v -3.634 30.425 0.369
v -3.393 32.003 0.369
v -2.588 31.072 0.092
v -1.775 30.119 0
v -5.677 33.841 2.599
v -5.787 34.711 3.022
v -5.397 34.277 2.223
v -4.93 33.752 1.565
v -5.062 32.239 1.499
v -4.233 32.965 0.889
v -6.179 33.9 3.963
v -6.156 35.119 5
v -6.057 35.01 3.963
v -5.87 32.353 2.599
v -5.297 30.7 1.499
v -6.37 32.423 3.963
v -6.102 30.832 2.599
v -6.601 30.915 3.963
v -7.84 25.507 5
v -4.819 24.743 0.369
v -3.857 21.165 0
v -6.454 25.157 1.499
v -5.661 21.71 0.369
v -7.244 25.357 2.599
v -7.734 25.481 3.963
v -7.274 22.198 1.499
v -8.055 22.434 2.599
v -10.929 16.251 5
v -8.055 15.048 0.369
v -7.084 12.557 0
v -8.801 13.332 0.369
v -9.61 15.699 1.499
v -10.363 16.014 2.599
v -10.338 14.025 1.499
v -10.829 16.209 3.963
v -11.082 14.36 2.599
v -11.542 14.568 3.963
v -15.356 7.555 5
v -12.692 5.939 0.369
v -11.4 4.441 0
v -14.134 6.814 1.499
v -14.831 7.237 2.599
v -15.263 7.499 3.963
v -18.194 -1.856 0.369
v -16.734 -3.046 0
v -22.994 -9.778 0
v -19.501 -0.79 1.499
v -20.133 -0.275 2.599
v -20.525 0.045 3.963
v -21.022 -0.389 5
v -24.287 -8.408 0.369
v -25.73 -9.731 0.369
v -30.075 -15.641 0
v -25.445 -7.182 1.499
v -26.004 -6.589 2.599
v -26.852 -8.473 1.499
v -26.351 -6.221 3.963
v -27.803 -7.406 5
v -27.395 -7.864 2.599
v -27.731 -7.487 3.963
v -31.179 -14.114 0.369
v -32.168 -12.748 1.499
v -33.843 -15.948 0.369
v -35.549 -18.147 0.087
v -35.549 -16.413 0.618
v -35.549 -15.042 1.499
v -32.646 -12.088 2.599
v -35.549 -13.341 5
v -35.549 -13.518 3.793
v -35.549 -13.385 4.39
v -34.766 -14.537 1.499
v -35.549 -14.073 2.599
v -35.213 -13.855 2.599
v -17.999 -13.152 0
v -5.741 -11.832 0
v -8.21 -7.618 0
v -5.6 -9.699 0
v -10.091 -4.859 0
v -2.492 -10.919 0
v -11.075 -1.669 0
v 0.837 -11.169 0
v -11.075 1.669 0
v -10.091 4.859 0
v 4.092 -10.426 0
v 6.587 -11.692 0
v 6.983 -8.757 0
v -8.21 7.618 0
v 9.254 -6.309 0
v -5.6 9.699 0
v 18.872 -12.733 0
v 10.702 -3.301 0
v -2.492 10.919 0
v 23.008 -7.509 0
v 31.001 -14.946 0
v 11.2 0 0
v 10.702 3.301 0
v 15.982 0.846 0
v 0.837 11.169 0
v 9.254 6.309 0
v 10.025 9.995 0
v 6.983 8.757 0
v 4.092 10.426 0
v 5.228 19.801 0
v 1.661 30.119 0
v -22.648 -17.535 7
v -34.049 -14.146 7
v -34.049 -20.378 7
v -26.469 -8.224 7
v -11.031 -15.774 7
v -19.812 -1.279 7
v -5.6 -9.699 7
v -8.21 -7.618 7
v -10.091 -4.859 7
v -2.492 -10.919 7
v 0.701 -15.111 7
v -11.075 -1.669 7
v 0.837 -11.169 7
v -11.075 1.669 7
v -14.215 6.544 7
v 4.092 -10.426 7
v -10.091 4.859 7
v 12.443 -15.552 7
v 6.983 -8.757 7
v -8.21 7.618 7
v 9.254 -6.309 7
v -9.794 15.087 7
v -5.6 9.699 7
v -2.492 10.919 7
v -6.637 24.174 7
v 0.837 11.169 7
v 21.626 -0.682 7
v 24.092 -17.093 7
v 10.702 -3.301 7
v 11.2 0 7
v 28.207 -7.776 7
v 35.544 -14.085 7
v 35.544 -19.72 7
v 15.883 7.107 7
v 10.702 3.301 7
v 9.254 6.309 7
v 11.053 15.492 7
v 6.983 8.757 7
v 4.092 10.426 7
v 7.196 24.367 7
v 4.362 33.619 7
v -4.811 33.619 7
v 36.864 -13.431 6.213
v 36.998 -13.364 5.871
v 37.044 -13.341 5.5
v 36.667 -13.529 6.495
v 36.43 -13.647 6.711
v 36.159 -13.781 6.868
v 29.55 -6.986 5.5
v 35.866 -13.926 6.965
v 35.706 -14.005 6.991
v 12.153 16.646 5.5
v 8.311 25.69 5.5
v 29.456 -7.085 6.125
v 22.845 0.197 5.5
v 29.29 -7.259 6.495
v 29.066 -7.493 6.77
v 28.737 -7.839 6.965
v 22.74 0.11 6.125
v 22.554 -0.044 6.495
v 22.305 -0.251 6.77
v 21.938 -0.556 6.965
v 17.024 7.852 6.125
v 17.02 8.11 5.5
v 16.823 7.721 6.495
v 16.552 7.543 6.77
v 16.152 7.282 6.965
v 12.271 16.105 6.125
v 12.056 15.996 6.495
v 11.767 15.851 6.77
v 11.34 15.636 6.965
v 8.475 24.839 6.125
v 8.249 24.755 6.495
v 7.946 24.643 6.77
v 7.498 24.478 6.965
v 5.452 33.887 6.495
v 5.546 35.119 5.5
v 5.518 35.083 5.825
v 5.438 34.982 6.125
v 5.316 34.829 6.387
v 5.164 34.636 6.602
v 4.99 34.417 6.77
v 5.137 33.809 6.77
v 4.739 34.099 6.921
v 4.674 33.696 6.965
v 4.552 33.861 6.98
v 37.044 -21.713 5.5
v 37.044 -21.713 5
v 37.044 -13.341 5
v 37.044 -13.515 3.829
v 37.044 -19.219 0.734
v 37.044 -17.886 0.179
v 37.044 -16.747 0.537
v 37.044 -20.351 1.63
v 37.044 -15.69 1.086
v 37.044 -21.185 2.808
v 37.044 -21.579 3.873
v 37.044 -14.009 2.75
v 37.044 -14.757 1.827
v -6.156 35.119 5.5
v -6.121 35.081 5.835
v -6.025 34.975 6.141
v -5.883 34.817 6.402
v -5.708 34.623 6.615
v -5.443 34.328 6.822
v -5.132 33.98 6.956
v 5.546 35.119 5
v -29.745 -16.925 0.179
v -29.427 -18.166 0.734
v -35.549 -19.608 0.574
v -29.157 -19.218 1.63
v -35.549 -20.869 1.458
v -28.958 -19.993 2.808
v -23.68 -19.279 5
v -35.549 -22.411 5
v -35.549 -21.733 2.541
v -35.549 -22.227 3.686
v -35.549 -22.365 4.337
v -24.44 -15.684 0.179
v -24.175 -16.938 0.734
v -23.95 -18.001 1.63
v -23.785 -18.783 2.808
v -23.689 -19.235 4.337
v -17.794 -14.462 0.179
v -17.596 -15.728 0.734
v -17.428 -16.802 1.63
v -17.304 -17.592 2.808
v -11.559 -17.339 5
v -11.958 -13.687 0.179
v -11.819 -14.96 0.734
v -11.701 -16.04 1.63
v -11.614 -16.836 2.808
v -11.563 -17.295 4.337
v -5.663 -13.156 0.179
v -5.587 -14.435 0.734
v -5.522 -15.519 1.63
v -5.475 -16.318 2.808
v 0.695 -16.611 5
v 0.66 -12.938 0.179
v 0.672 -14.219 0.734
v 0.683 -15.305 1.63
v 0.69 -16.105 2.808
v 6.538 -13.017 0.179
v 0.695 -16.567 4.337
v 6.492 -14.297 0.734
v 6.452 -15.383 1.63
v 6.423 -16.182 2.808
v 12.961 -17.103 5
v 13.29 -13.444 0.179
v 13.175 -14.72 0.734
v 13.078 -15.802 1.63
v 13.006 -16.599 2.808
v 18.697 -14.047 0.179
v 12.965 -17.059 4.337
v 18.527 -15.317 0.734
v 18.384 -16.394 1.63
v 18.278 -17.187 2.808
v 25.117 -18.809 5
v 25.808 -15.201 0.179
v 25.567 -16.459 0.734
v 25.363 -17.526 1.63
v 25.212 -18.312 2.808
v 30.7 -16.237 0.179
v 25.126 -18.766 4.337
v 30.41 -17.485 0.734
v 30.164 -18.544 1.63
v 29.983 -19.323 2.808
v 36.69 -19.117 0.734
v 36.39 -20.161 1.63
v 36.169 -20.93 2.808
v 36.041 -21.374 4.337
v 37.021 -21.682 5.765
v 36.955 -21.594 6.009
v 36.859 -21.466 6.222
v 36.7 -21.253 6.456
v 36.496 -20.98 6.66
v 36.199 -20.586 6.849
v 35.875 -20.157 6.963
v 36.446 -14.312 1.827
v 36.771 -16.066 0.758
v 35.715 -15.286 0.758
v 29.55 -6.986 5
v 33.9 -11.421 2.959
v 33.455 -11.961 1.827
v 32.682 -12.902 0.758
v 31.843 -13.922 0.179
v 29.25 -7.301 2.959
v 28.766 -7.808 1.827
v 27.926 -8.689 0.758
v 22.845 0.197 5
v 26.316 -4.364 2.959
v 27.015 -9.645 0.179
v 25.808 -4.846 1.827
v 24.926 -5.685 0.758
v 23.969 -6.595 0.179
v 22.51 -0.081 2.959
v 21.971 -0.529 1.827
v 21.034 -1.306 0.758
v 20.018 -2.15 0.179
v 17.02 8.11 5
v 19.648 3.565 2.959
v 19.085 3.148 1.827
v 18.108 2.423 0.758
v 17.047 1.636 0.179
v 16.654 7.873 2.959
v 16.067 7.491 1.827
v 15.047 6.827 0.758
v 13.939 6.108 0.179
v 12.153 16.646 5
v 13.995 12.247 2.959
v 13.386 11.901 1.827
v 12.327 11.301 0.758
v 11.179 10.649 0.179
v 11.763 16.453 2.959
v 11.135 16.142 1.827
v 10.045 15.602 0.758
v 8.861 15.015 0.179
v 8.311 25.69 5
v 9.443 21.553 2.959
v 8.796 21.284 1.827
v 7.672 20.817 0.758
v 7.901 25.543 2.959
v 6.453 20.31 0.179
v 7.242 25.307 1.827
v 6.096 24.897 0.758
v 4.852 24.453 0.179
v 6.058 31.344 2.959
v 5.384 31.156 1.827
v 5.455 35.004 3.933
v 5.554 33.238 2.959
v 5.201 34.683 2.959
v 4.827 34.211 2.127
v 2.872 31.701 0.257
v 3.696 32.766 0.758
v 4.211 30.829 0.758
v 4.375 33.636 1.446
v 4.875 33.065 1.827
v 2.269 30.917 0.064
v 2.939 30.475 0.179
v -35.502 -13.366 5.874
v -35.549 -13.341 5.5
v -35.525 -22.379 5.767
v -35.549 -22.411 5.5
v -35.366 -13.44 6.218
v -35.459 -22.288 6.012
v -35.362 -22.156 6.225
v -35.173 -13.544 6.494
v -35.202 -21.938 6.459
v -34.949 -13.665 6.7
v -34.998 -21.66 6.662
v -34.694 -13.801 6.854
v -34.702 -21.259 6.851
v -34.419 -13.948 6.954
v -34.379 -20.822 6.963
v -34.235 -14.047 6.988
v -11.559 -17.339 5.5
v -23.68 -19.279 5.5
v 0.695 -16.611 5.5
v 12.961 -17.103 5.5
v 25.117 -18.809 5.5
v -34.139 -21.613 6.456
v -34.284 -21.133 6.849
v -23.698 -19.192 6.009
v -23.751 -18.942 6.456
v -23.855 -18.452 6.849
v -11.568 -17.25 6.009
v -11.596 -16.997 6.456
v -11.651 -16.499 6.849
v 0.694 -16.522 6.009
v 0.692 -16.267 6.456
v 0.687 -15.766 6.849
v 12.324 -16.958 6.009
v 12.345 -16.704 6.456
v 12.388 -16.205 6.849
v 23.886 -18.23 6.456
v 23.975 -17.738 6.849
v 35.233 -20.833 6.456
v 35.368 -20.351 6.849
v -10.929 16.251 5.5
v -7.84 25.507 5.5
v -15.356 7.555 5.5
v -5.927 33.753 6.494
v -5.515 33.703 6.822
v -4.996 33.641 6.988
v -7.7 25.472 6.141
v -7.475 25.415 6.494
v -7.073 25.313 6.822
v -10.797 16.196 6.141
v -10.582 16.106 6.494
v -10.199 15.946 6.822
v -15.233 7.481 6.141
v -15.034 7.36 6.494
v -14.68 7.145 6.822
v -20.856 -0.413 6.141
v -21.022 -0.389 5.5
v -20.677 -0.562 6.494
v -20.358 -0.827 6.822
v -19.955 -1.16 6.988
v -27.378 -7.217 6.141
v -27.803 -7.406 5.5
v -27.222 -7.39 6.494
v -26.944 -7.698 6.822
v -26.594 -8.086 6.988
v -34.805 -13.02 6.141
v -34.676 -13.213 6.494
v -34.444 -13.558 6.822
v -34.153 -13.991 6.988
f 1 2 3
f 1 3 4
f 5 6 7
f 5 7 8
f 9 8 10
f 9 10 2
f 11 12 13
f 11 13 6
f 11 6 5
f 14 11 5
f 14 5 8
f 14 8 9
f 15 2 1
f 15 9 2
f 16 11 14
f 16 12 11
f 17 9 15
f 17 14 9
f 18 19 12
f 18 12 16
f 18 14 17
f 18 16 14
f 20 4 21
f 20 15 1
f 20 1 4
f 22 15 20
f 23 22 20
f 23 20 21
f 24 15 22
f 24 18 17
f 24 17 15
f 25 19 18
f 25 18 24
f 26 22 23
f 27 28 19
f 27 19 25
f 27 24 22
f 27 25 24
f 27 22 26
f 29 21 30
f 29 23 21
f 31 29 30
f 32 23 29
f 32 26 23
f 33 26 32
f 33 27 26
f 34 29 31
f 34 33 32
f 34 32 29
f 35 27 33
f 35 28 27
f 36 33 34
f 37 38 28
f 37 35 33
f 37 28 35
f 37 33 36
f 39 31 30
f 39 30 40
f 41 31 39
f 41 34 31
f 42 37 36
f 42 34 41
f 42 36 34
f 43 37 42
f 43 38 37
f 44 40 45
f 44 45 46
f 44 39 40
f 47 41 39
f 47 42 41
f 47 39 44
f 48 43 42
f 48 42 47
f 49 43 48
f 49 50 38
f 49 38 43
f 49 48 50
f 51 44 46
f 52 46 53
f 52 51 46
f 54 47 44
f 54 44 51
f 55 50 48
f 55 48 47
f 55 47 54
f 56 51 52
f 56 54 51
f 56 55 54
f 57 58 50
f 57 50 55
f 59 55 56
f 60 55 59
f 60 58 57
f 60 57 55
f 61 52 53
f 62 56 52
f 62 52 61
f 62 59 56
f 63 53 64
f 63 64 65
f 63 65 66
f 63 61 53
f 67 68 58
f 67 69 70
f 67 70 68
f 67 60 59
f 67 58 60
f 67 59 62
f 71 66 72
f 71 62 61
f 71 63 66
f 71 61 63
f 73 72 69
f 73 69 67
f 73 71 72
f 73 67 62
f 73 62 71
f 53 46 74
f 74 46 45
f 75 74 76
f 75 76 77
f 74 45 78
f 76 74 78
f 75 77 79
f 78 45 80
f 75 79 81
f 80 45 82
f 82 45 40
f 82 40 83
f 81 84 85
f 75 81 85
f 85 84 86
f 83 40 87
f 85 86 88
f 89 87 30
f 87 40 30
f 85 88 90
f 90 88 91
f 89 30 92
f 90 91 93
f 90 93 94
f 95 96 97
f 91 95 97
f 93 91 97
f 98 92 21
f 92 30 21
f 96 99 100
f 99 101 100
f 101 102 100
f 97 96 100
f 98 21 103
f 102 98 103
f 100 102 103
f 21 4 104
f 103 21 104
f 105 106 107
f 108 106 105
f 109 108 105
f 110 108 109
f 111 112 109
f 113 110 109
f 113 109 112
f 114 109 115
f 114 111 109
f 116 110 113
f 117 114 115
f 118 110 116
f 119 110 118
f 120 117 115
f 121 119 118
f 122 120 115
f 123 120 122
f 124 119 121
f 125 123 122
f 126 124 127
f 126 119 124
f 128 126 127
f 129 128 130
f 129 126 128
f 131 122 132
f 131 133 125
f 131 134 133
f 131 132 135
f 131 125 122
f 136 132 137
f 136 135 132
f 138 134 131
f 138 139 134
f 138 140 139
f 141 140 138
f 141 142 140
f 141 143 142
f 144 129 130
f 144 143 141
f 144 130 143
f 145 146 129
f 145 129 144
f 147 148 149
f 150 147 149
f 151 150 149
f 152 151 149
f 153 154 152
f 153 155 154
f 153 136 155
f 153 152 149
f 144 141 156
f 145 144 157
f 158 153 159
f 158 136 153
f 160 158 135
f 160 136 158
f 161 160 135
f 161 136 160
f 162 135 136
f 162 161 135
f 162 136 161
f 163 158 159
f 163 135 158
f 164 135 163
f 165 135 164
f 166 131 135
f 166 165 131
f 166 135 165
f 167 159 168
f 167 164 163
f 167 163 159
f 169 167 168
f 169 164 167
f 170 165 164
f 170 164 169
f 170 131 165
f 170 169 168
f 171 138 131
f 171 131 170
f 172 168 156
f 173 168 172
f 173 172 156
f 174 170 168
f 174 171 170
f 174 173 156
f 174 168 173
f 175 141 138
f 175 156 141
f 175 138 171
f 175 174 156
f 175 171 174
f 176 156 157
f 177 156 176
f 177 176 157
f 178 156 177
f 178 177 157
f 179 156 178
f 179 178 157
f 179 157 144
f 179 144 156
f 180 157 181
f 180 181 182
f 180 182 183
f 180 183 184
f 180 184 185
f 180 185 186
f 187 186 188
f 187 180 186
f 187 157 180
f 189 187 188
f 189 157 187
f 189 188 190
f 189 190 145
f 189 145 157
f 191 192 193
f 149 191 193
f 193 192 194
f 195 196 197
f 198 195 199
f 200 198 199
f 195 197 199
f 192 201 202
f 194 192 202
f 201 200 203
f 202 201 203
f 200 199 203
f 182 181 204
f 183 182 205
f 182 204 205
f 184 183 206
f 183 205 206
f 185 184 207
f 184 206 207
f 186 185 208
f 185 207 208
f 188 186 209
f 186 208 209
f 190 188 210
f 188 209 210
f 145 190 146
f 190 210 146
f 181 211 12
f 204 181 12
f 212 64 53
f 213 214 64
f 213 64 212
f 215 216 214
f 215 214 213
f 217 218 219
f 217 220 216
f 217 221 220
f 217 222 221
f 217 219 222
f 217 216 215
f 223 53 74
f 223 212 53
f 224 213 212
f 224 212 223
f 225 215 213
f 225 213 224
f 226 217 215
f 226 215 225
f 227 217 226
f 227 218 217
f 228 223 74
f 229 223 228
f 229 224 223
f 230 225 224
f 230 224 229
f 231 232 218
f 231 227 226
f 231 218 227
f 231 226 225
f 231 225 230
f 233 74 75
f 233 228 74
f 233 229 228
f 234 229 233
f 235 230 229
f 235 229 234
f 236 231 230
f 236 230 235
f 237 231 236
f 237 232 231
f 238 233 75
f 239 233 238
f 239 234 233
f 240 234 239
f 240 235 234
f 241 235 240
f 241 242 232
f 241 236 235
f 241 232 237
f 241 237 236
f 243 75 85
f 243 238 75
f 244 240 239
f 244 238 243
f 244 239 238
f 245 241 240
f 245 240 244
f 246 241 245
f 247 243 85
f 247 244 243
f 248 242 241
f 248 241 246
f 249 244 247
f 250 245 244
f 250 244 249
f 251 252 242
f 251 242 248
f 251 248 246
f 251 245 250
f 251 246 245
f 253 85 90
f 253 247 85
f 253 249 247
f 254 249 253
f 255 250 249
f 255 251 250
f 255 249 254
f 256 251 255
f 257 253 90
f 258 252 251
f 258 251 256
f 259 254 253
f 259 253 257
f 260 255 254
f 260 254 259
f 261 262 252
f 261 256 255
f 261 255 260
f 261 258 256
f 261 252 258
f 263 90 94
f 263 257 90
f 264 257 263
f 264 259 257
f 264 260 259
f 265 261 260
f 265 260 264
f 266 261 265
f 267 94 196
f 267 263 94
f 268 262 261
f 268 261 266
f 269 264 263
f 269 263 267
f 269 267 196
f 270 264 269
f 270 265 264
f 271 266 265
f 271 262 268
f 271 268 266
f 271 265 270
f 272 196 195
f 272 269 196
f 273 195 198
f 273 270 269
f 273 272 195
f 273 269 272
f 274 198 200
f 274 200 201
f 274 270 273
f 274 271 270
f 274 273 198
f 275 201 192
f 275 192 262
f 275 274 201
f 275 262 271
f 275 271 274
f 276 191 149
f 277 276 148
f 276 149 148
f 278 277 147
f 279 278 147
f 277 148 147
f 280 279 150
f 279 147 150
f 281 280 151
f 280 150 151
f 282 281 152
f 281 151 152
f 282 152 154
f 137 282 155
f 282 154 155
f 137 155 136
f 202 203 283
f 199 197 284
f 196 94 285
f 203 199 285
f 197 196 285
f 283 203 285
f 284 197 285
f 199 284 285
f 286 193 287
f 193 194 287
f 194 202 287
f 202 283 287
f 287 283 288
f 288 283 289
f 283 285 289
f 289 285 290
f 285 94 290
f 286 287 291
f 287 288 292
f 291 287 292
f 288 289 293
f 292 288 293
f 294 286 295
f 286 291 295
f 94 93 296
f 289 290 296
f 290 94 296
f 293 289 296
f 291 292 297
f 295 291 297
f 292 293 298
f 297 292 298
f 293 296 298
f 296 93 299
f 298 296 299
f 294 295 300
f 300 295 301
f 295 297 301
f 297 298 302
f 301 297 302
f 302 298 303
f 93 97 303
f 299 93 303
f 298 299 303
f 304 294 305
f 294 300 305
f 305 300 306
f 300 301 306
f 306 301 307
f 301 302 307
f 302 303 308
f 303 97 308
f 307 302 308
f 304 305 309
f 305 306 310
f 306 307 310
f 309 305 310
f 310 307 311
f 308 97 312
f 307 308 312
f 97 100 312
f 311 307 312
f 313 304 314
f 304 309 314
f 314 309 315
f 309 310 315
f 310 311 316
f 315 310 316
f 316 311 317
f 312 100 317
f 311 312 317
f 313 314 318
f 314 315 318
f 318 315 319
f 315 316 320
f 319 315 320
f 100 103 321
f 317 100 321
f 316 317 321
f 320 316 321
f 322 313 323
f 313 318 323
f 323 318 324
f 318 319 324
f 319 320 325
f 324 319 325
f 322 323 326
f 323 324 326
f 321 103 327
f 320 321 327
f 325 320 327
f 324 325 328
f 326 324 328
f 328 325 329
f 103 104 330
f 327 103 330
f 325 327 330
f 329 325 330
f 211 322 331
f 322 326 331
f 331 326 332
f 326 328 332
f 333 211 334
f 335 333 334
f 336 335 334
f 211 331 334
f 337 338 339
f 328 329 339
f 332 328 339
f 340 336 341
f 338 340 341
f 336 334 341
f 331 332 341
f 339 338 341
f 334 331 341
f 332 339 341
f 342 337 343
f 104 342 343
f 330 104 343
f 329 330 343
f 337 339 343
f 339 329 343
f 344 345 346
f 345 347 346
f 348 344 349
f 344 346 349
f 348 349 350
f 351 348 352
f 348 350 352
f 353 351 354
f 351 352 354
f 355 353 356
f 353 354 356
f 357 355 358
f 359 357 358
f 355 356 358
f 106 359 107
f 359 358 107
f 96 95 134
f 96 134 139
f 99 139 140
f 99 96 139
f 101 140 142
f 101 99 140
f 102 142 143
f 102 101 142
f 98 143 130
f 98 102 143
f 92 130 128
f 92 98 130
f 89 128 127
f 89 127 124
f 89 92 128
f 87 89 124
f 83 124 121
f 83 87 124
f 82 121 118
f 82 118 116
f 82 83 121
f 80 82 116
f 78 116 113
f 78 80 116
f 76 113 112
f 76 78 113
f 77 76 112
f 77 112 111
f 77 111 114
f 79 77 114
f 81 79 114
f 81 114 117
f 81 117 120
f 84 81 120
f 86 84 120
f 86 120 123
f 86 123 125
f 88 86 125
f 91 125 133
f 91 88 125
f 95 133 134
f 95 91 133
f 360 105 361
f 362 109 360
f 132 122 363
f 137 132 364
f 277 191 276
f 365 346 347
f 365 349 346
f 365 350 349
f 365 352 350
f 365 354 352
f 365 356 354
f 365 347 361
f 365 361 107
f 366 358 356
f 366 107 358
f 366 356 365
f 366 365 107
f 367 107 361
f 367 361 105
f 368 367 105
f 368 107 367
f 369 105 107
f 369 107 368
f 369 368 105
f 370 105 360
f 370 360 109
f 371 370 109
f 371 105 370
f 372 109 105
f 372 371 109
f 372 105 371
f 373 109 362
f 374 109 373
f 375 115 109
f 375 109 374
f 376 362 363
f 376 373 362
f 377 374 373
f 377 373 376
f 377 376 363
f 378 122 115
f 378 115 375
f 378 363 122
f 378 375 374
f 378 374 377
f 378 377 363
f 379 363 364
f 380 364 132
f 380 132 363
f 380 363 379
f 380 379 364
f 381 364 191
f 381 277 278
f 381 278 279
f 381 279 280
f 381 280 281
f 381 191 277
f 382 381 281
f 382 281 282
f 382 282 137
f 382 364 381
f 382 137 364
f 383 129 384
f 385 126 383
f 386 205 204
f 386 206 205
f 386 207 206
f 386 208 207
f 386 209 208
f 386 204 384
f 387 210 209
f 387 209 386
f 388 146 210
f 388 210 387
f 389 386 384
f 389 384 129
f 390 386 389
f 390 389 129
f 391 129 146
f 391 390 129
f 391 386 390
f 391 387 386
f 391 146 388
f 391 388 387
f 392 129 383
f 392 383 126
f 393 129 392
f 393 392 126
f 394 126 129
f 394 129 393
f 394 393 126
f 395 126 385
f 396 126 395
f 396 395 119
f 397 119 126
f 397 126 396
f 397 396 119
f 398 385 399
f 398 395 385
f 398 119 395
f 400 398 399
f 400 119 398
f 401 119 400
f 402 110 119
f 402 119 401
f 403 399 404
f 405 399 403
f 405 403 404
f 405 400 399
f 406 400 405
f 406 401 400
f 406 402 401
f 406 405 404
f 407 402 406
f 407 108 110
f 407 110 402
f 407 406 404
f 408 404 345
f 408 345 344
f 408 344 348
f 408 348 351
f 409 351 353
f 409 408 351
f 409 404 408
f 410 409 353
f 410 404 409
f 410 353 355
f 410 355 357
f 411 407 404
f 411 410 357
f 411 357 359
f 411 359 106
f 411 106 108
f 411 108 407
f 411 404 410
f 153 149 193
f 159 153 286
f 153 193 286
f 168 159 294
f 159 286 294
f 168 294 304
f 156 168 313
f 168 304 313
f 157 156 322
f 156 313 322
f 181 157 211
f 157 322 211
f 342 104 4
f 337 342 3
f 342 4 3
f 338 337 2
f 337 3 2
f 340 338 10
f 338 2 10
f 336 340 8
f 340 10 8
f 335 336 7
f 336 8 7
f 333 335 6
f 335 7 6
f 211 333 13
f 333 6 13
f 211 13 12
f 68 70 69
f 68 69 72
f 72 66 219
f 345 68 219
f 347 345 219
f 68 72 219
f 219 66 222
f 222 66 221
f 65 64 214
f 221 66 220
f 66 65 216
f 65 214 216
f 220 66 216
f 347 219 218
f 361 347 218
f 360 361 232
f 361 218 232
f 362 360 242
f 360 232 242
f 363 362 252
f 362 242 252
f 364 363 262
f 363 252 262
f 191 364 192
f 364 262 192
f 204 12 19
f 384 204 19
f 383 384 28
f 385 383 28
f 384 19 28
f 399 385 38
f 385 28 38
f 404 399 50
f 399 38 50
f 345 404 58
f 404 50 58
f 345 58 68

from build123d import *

# Parameters (mm, degrees)
F0_R        = 11.2
F1_DEPTH    = 7
F2_R        = 1.5
F3_T1_DEPTH = 36.7018774228
F3_T4_ANGLE = 72.934456587
F3_T6_ANGLE = 45.7548994245
F3_T8_ANGLE = 56.9956661229


# Not quite as in the source:
# - a fillet or chamfer that OpenCascade refuses, or shapes differently, is made with other operations: its cross-section is extruded or revolved along the edge and cut away or added


with BuildPart() as f1:
    # F0 (on Top) → F1 (new body)
    with BuildSketch(Plane.XY):
        with BuildLine():
            ThreePointArc((-6.1555781478, 35.1188629866), (-15.3560457965, 7.5552379901), (-35.5490386319, -13.3408159018))
            Line((-35.5490386319, -13.3408159018), (-35.5490386319, -22.4113118275))
            ThreePointArc((-35.5490386319, -22.4113118275), (0.6952562714, -16.6112557297), (37.0443966853, -21.713172521))
            Line((37.0443966853, -21.713172521), (37.0443966853, -13.3408159018))
            ThreePointArc((37.0443966853, -13.3408159018), (17.019752647, 8.1099477957), (5.546299275, 35.1188629866))
            Line((5.546299275, 35.1188629866), (-6.1555781478, 35.1188629866))
        make_face()
        Circle(F0_R, mode=Mode.SUBTRACT)
    extrude(amount=F1_DEPTH)

    # F2
    f2_edges = [f1.edges().sort_by_distance(p)[0] for p in [
        (-35.549039, -17.876064, 7),
        (0.695256, -16.611256, 7),
        (-15.356046, 7.555238, 7),
        (17.019753, 8.109948, 7),
        (37.044397, -17.526994, 7),
        (-0.304639, 35.118863, 7),
    ]]
    fillet(f2_edges, radius=F2_R)

    # F3: fillet of radius 5 on 6 edges, made by hand

    # F3_s2 → F3_t1 (cut)
    with BuildSketch(Plane.YZ.offset(-18.6555781478)):
        with BuildLine():
            ThreePointArc((30.1188629866, 0), (33.6543968925, 1.4644660941), (35.1188629866, 5))
            Line((35.1188629866, 5), (35.1188629866, 0))
            Line((35.1188629866, 0), (30.1188629866, 0))
        make_face()
    extrude(amount=F3_T1_DEPTH, mode=Mode.SUBTRACT)

    # F3_s3 → F3_t4 (revolve, cut)
    with BuildSketch(Plane(origin=(-4.3701670653, 47.7604075053, 0), x_dir=(0, 0, 1), z_dir=(-0.0911212144, 0.9958398085, 0))):
        with BuildLine():
            ThreePointArc((0, 3.2563304614), (1.4644660941, -0.2792034445), (5, -1.7436695386))
            Line((5, -1.7436695386), (0, -1.7436695386))
            Line((0, -1.7436695386), (0, 3.2563304614))
        make_face()
    revolve(axis=Axis((-71.5118436224, 41.6168178894, 0), (0, 0, -1)), revolution_arc=F3_T4_ANGLE, mode=Mode.SUBTRACT)

    # F3_s5 → F3_t6 (revolve, cut)
    with BuildSketch(Plane(origin=(-49.5559041376, -21.4739784979, 0), x_dir=(0, 0, 1), z_dir=(-0.9175572913, -0.3976035931, 0))):
        with BuildLine():
            ThreePointArc((0, -0.7975032251), (1.4644660941, -4.333037131), (5, -5.7975032251))
            Line((5, -5.7975032251), (0, -5.7975032251))
            Line((0, -5.7975032251), (0, -0.7975032251))
        make_face()
    revolve(axis=Axis((1.8836501986, -140.182005695, 0), (0, 0, -1)), revolution_arc=F3_T6_ANGLE, mode=Mode.SUBTRACT)

    # F3_s7 → F3_t8 (revolve, cut)
    with BuildSketch(Plane(origin=(45.161339961, -24.4990526211, 0), x_dir=(0, 0, 1), z_dir=(0.8789929725, -0.4768347243, 0))):
        with BuildLine():
            ThreePointArc((5, -5.0138287397), (1.4644660941, -3.5493626456), (0, -0.0138287397))
            Line((0, -0.0138287397), (0, -5.0138287397))
            Line((0, -5.0138287397), (5, -5.0138287397))
        make_face()
    revolve(axis=Axis((87.8129156777, 54.1244901178, 0), (0, 0, -1)), revolution_arc=F3_T8_ANGLE, mode=Mode.SUBTRACT)


solid = f1.part
